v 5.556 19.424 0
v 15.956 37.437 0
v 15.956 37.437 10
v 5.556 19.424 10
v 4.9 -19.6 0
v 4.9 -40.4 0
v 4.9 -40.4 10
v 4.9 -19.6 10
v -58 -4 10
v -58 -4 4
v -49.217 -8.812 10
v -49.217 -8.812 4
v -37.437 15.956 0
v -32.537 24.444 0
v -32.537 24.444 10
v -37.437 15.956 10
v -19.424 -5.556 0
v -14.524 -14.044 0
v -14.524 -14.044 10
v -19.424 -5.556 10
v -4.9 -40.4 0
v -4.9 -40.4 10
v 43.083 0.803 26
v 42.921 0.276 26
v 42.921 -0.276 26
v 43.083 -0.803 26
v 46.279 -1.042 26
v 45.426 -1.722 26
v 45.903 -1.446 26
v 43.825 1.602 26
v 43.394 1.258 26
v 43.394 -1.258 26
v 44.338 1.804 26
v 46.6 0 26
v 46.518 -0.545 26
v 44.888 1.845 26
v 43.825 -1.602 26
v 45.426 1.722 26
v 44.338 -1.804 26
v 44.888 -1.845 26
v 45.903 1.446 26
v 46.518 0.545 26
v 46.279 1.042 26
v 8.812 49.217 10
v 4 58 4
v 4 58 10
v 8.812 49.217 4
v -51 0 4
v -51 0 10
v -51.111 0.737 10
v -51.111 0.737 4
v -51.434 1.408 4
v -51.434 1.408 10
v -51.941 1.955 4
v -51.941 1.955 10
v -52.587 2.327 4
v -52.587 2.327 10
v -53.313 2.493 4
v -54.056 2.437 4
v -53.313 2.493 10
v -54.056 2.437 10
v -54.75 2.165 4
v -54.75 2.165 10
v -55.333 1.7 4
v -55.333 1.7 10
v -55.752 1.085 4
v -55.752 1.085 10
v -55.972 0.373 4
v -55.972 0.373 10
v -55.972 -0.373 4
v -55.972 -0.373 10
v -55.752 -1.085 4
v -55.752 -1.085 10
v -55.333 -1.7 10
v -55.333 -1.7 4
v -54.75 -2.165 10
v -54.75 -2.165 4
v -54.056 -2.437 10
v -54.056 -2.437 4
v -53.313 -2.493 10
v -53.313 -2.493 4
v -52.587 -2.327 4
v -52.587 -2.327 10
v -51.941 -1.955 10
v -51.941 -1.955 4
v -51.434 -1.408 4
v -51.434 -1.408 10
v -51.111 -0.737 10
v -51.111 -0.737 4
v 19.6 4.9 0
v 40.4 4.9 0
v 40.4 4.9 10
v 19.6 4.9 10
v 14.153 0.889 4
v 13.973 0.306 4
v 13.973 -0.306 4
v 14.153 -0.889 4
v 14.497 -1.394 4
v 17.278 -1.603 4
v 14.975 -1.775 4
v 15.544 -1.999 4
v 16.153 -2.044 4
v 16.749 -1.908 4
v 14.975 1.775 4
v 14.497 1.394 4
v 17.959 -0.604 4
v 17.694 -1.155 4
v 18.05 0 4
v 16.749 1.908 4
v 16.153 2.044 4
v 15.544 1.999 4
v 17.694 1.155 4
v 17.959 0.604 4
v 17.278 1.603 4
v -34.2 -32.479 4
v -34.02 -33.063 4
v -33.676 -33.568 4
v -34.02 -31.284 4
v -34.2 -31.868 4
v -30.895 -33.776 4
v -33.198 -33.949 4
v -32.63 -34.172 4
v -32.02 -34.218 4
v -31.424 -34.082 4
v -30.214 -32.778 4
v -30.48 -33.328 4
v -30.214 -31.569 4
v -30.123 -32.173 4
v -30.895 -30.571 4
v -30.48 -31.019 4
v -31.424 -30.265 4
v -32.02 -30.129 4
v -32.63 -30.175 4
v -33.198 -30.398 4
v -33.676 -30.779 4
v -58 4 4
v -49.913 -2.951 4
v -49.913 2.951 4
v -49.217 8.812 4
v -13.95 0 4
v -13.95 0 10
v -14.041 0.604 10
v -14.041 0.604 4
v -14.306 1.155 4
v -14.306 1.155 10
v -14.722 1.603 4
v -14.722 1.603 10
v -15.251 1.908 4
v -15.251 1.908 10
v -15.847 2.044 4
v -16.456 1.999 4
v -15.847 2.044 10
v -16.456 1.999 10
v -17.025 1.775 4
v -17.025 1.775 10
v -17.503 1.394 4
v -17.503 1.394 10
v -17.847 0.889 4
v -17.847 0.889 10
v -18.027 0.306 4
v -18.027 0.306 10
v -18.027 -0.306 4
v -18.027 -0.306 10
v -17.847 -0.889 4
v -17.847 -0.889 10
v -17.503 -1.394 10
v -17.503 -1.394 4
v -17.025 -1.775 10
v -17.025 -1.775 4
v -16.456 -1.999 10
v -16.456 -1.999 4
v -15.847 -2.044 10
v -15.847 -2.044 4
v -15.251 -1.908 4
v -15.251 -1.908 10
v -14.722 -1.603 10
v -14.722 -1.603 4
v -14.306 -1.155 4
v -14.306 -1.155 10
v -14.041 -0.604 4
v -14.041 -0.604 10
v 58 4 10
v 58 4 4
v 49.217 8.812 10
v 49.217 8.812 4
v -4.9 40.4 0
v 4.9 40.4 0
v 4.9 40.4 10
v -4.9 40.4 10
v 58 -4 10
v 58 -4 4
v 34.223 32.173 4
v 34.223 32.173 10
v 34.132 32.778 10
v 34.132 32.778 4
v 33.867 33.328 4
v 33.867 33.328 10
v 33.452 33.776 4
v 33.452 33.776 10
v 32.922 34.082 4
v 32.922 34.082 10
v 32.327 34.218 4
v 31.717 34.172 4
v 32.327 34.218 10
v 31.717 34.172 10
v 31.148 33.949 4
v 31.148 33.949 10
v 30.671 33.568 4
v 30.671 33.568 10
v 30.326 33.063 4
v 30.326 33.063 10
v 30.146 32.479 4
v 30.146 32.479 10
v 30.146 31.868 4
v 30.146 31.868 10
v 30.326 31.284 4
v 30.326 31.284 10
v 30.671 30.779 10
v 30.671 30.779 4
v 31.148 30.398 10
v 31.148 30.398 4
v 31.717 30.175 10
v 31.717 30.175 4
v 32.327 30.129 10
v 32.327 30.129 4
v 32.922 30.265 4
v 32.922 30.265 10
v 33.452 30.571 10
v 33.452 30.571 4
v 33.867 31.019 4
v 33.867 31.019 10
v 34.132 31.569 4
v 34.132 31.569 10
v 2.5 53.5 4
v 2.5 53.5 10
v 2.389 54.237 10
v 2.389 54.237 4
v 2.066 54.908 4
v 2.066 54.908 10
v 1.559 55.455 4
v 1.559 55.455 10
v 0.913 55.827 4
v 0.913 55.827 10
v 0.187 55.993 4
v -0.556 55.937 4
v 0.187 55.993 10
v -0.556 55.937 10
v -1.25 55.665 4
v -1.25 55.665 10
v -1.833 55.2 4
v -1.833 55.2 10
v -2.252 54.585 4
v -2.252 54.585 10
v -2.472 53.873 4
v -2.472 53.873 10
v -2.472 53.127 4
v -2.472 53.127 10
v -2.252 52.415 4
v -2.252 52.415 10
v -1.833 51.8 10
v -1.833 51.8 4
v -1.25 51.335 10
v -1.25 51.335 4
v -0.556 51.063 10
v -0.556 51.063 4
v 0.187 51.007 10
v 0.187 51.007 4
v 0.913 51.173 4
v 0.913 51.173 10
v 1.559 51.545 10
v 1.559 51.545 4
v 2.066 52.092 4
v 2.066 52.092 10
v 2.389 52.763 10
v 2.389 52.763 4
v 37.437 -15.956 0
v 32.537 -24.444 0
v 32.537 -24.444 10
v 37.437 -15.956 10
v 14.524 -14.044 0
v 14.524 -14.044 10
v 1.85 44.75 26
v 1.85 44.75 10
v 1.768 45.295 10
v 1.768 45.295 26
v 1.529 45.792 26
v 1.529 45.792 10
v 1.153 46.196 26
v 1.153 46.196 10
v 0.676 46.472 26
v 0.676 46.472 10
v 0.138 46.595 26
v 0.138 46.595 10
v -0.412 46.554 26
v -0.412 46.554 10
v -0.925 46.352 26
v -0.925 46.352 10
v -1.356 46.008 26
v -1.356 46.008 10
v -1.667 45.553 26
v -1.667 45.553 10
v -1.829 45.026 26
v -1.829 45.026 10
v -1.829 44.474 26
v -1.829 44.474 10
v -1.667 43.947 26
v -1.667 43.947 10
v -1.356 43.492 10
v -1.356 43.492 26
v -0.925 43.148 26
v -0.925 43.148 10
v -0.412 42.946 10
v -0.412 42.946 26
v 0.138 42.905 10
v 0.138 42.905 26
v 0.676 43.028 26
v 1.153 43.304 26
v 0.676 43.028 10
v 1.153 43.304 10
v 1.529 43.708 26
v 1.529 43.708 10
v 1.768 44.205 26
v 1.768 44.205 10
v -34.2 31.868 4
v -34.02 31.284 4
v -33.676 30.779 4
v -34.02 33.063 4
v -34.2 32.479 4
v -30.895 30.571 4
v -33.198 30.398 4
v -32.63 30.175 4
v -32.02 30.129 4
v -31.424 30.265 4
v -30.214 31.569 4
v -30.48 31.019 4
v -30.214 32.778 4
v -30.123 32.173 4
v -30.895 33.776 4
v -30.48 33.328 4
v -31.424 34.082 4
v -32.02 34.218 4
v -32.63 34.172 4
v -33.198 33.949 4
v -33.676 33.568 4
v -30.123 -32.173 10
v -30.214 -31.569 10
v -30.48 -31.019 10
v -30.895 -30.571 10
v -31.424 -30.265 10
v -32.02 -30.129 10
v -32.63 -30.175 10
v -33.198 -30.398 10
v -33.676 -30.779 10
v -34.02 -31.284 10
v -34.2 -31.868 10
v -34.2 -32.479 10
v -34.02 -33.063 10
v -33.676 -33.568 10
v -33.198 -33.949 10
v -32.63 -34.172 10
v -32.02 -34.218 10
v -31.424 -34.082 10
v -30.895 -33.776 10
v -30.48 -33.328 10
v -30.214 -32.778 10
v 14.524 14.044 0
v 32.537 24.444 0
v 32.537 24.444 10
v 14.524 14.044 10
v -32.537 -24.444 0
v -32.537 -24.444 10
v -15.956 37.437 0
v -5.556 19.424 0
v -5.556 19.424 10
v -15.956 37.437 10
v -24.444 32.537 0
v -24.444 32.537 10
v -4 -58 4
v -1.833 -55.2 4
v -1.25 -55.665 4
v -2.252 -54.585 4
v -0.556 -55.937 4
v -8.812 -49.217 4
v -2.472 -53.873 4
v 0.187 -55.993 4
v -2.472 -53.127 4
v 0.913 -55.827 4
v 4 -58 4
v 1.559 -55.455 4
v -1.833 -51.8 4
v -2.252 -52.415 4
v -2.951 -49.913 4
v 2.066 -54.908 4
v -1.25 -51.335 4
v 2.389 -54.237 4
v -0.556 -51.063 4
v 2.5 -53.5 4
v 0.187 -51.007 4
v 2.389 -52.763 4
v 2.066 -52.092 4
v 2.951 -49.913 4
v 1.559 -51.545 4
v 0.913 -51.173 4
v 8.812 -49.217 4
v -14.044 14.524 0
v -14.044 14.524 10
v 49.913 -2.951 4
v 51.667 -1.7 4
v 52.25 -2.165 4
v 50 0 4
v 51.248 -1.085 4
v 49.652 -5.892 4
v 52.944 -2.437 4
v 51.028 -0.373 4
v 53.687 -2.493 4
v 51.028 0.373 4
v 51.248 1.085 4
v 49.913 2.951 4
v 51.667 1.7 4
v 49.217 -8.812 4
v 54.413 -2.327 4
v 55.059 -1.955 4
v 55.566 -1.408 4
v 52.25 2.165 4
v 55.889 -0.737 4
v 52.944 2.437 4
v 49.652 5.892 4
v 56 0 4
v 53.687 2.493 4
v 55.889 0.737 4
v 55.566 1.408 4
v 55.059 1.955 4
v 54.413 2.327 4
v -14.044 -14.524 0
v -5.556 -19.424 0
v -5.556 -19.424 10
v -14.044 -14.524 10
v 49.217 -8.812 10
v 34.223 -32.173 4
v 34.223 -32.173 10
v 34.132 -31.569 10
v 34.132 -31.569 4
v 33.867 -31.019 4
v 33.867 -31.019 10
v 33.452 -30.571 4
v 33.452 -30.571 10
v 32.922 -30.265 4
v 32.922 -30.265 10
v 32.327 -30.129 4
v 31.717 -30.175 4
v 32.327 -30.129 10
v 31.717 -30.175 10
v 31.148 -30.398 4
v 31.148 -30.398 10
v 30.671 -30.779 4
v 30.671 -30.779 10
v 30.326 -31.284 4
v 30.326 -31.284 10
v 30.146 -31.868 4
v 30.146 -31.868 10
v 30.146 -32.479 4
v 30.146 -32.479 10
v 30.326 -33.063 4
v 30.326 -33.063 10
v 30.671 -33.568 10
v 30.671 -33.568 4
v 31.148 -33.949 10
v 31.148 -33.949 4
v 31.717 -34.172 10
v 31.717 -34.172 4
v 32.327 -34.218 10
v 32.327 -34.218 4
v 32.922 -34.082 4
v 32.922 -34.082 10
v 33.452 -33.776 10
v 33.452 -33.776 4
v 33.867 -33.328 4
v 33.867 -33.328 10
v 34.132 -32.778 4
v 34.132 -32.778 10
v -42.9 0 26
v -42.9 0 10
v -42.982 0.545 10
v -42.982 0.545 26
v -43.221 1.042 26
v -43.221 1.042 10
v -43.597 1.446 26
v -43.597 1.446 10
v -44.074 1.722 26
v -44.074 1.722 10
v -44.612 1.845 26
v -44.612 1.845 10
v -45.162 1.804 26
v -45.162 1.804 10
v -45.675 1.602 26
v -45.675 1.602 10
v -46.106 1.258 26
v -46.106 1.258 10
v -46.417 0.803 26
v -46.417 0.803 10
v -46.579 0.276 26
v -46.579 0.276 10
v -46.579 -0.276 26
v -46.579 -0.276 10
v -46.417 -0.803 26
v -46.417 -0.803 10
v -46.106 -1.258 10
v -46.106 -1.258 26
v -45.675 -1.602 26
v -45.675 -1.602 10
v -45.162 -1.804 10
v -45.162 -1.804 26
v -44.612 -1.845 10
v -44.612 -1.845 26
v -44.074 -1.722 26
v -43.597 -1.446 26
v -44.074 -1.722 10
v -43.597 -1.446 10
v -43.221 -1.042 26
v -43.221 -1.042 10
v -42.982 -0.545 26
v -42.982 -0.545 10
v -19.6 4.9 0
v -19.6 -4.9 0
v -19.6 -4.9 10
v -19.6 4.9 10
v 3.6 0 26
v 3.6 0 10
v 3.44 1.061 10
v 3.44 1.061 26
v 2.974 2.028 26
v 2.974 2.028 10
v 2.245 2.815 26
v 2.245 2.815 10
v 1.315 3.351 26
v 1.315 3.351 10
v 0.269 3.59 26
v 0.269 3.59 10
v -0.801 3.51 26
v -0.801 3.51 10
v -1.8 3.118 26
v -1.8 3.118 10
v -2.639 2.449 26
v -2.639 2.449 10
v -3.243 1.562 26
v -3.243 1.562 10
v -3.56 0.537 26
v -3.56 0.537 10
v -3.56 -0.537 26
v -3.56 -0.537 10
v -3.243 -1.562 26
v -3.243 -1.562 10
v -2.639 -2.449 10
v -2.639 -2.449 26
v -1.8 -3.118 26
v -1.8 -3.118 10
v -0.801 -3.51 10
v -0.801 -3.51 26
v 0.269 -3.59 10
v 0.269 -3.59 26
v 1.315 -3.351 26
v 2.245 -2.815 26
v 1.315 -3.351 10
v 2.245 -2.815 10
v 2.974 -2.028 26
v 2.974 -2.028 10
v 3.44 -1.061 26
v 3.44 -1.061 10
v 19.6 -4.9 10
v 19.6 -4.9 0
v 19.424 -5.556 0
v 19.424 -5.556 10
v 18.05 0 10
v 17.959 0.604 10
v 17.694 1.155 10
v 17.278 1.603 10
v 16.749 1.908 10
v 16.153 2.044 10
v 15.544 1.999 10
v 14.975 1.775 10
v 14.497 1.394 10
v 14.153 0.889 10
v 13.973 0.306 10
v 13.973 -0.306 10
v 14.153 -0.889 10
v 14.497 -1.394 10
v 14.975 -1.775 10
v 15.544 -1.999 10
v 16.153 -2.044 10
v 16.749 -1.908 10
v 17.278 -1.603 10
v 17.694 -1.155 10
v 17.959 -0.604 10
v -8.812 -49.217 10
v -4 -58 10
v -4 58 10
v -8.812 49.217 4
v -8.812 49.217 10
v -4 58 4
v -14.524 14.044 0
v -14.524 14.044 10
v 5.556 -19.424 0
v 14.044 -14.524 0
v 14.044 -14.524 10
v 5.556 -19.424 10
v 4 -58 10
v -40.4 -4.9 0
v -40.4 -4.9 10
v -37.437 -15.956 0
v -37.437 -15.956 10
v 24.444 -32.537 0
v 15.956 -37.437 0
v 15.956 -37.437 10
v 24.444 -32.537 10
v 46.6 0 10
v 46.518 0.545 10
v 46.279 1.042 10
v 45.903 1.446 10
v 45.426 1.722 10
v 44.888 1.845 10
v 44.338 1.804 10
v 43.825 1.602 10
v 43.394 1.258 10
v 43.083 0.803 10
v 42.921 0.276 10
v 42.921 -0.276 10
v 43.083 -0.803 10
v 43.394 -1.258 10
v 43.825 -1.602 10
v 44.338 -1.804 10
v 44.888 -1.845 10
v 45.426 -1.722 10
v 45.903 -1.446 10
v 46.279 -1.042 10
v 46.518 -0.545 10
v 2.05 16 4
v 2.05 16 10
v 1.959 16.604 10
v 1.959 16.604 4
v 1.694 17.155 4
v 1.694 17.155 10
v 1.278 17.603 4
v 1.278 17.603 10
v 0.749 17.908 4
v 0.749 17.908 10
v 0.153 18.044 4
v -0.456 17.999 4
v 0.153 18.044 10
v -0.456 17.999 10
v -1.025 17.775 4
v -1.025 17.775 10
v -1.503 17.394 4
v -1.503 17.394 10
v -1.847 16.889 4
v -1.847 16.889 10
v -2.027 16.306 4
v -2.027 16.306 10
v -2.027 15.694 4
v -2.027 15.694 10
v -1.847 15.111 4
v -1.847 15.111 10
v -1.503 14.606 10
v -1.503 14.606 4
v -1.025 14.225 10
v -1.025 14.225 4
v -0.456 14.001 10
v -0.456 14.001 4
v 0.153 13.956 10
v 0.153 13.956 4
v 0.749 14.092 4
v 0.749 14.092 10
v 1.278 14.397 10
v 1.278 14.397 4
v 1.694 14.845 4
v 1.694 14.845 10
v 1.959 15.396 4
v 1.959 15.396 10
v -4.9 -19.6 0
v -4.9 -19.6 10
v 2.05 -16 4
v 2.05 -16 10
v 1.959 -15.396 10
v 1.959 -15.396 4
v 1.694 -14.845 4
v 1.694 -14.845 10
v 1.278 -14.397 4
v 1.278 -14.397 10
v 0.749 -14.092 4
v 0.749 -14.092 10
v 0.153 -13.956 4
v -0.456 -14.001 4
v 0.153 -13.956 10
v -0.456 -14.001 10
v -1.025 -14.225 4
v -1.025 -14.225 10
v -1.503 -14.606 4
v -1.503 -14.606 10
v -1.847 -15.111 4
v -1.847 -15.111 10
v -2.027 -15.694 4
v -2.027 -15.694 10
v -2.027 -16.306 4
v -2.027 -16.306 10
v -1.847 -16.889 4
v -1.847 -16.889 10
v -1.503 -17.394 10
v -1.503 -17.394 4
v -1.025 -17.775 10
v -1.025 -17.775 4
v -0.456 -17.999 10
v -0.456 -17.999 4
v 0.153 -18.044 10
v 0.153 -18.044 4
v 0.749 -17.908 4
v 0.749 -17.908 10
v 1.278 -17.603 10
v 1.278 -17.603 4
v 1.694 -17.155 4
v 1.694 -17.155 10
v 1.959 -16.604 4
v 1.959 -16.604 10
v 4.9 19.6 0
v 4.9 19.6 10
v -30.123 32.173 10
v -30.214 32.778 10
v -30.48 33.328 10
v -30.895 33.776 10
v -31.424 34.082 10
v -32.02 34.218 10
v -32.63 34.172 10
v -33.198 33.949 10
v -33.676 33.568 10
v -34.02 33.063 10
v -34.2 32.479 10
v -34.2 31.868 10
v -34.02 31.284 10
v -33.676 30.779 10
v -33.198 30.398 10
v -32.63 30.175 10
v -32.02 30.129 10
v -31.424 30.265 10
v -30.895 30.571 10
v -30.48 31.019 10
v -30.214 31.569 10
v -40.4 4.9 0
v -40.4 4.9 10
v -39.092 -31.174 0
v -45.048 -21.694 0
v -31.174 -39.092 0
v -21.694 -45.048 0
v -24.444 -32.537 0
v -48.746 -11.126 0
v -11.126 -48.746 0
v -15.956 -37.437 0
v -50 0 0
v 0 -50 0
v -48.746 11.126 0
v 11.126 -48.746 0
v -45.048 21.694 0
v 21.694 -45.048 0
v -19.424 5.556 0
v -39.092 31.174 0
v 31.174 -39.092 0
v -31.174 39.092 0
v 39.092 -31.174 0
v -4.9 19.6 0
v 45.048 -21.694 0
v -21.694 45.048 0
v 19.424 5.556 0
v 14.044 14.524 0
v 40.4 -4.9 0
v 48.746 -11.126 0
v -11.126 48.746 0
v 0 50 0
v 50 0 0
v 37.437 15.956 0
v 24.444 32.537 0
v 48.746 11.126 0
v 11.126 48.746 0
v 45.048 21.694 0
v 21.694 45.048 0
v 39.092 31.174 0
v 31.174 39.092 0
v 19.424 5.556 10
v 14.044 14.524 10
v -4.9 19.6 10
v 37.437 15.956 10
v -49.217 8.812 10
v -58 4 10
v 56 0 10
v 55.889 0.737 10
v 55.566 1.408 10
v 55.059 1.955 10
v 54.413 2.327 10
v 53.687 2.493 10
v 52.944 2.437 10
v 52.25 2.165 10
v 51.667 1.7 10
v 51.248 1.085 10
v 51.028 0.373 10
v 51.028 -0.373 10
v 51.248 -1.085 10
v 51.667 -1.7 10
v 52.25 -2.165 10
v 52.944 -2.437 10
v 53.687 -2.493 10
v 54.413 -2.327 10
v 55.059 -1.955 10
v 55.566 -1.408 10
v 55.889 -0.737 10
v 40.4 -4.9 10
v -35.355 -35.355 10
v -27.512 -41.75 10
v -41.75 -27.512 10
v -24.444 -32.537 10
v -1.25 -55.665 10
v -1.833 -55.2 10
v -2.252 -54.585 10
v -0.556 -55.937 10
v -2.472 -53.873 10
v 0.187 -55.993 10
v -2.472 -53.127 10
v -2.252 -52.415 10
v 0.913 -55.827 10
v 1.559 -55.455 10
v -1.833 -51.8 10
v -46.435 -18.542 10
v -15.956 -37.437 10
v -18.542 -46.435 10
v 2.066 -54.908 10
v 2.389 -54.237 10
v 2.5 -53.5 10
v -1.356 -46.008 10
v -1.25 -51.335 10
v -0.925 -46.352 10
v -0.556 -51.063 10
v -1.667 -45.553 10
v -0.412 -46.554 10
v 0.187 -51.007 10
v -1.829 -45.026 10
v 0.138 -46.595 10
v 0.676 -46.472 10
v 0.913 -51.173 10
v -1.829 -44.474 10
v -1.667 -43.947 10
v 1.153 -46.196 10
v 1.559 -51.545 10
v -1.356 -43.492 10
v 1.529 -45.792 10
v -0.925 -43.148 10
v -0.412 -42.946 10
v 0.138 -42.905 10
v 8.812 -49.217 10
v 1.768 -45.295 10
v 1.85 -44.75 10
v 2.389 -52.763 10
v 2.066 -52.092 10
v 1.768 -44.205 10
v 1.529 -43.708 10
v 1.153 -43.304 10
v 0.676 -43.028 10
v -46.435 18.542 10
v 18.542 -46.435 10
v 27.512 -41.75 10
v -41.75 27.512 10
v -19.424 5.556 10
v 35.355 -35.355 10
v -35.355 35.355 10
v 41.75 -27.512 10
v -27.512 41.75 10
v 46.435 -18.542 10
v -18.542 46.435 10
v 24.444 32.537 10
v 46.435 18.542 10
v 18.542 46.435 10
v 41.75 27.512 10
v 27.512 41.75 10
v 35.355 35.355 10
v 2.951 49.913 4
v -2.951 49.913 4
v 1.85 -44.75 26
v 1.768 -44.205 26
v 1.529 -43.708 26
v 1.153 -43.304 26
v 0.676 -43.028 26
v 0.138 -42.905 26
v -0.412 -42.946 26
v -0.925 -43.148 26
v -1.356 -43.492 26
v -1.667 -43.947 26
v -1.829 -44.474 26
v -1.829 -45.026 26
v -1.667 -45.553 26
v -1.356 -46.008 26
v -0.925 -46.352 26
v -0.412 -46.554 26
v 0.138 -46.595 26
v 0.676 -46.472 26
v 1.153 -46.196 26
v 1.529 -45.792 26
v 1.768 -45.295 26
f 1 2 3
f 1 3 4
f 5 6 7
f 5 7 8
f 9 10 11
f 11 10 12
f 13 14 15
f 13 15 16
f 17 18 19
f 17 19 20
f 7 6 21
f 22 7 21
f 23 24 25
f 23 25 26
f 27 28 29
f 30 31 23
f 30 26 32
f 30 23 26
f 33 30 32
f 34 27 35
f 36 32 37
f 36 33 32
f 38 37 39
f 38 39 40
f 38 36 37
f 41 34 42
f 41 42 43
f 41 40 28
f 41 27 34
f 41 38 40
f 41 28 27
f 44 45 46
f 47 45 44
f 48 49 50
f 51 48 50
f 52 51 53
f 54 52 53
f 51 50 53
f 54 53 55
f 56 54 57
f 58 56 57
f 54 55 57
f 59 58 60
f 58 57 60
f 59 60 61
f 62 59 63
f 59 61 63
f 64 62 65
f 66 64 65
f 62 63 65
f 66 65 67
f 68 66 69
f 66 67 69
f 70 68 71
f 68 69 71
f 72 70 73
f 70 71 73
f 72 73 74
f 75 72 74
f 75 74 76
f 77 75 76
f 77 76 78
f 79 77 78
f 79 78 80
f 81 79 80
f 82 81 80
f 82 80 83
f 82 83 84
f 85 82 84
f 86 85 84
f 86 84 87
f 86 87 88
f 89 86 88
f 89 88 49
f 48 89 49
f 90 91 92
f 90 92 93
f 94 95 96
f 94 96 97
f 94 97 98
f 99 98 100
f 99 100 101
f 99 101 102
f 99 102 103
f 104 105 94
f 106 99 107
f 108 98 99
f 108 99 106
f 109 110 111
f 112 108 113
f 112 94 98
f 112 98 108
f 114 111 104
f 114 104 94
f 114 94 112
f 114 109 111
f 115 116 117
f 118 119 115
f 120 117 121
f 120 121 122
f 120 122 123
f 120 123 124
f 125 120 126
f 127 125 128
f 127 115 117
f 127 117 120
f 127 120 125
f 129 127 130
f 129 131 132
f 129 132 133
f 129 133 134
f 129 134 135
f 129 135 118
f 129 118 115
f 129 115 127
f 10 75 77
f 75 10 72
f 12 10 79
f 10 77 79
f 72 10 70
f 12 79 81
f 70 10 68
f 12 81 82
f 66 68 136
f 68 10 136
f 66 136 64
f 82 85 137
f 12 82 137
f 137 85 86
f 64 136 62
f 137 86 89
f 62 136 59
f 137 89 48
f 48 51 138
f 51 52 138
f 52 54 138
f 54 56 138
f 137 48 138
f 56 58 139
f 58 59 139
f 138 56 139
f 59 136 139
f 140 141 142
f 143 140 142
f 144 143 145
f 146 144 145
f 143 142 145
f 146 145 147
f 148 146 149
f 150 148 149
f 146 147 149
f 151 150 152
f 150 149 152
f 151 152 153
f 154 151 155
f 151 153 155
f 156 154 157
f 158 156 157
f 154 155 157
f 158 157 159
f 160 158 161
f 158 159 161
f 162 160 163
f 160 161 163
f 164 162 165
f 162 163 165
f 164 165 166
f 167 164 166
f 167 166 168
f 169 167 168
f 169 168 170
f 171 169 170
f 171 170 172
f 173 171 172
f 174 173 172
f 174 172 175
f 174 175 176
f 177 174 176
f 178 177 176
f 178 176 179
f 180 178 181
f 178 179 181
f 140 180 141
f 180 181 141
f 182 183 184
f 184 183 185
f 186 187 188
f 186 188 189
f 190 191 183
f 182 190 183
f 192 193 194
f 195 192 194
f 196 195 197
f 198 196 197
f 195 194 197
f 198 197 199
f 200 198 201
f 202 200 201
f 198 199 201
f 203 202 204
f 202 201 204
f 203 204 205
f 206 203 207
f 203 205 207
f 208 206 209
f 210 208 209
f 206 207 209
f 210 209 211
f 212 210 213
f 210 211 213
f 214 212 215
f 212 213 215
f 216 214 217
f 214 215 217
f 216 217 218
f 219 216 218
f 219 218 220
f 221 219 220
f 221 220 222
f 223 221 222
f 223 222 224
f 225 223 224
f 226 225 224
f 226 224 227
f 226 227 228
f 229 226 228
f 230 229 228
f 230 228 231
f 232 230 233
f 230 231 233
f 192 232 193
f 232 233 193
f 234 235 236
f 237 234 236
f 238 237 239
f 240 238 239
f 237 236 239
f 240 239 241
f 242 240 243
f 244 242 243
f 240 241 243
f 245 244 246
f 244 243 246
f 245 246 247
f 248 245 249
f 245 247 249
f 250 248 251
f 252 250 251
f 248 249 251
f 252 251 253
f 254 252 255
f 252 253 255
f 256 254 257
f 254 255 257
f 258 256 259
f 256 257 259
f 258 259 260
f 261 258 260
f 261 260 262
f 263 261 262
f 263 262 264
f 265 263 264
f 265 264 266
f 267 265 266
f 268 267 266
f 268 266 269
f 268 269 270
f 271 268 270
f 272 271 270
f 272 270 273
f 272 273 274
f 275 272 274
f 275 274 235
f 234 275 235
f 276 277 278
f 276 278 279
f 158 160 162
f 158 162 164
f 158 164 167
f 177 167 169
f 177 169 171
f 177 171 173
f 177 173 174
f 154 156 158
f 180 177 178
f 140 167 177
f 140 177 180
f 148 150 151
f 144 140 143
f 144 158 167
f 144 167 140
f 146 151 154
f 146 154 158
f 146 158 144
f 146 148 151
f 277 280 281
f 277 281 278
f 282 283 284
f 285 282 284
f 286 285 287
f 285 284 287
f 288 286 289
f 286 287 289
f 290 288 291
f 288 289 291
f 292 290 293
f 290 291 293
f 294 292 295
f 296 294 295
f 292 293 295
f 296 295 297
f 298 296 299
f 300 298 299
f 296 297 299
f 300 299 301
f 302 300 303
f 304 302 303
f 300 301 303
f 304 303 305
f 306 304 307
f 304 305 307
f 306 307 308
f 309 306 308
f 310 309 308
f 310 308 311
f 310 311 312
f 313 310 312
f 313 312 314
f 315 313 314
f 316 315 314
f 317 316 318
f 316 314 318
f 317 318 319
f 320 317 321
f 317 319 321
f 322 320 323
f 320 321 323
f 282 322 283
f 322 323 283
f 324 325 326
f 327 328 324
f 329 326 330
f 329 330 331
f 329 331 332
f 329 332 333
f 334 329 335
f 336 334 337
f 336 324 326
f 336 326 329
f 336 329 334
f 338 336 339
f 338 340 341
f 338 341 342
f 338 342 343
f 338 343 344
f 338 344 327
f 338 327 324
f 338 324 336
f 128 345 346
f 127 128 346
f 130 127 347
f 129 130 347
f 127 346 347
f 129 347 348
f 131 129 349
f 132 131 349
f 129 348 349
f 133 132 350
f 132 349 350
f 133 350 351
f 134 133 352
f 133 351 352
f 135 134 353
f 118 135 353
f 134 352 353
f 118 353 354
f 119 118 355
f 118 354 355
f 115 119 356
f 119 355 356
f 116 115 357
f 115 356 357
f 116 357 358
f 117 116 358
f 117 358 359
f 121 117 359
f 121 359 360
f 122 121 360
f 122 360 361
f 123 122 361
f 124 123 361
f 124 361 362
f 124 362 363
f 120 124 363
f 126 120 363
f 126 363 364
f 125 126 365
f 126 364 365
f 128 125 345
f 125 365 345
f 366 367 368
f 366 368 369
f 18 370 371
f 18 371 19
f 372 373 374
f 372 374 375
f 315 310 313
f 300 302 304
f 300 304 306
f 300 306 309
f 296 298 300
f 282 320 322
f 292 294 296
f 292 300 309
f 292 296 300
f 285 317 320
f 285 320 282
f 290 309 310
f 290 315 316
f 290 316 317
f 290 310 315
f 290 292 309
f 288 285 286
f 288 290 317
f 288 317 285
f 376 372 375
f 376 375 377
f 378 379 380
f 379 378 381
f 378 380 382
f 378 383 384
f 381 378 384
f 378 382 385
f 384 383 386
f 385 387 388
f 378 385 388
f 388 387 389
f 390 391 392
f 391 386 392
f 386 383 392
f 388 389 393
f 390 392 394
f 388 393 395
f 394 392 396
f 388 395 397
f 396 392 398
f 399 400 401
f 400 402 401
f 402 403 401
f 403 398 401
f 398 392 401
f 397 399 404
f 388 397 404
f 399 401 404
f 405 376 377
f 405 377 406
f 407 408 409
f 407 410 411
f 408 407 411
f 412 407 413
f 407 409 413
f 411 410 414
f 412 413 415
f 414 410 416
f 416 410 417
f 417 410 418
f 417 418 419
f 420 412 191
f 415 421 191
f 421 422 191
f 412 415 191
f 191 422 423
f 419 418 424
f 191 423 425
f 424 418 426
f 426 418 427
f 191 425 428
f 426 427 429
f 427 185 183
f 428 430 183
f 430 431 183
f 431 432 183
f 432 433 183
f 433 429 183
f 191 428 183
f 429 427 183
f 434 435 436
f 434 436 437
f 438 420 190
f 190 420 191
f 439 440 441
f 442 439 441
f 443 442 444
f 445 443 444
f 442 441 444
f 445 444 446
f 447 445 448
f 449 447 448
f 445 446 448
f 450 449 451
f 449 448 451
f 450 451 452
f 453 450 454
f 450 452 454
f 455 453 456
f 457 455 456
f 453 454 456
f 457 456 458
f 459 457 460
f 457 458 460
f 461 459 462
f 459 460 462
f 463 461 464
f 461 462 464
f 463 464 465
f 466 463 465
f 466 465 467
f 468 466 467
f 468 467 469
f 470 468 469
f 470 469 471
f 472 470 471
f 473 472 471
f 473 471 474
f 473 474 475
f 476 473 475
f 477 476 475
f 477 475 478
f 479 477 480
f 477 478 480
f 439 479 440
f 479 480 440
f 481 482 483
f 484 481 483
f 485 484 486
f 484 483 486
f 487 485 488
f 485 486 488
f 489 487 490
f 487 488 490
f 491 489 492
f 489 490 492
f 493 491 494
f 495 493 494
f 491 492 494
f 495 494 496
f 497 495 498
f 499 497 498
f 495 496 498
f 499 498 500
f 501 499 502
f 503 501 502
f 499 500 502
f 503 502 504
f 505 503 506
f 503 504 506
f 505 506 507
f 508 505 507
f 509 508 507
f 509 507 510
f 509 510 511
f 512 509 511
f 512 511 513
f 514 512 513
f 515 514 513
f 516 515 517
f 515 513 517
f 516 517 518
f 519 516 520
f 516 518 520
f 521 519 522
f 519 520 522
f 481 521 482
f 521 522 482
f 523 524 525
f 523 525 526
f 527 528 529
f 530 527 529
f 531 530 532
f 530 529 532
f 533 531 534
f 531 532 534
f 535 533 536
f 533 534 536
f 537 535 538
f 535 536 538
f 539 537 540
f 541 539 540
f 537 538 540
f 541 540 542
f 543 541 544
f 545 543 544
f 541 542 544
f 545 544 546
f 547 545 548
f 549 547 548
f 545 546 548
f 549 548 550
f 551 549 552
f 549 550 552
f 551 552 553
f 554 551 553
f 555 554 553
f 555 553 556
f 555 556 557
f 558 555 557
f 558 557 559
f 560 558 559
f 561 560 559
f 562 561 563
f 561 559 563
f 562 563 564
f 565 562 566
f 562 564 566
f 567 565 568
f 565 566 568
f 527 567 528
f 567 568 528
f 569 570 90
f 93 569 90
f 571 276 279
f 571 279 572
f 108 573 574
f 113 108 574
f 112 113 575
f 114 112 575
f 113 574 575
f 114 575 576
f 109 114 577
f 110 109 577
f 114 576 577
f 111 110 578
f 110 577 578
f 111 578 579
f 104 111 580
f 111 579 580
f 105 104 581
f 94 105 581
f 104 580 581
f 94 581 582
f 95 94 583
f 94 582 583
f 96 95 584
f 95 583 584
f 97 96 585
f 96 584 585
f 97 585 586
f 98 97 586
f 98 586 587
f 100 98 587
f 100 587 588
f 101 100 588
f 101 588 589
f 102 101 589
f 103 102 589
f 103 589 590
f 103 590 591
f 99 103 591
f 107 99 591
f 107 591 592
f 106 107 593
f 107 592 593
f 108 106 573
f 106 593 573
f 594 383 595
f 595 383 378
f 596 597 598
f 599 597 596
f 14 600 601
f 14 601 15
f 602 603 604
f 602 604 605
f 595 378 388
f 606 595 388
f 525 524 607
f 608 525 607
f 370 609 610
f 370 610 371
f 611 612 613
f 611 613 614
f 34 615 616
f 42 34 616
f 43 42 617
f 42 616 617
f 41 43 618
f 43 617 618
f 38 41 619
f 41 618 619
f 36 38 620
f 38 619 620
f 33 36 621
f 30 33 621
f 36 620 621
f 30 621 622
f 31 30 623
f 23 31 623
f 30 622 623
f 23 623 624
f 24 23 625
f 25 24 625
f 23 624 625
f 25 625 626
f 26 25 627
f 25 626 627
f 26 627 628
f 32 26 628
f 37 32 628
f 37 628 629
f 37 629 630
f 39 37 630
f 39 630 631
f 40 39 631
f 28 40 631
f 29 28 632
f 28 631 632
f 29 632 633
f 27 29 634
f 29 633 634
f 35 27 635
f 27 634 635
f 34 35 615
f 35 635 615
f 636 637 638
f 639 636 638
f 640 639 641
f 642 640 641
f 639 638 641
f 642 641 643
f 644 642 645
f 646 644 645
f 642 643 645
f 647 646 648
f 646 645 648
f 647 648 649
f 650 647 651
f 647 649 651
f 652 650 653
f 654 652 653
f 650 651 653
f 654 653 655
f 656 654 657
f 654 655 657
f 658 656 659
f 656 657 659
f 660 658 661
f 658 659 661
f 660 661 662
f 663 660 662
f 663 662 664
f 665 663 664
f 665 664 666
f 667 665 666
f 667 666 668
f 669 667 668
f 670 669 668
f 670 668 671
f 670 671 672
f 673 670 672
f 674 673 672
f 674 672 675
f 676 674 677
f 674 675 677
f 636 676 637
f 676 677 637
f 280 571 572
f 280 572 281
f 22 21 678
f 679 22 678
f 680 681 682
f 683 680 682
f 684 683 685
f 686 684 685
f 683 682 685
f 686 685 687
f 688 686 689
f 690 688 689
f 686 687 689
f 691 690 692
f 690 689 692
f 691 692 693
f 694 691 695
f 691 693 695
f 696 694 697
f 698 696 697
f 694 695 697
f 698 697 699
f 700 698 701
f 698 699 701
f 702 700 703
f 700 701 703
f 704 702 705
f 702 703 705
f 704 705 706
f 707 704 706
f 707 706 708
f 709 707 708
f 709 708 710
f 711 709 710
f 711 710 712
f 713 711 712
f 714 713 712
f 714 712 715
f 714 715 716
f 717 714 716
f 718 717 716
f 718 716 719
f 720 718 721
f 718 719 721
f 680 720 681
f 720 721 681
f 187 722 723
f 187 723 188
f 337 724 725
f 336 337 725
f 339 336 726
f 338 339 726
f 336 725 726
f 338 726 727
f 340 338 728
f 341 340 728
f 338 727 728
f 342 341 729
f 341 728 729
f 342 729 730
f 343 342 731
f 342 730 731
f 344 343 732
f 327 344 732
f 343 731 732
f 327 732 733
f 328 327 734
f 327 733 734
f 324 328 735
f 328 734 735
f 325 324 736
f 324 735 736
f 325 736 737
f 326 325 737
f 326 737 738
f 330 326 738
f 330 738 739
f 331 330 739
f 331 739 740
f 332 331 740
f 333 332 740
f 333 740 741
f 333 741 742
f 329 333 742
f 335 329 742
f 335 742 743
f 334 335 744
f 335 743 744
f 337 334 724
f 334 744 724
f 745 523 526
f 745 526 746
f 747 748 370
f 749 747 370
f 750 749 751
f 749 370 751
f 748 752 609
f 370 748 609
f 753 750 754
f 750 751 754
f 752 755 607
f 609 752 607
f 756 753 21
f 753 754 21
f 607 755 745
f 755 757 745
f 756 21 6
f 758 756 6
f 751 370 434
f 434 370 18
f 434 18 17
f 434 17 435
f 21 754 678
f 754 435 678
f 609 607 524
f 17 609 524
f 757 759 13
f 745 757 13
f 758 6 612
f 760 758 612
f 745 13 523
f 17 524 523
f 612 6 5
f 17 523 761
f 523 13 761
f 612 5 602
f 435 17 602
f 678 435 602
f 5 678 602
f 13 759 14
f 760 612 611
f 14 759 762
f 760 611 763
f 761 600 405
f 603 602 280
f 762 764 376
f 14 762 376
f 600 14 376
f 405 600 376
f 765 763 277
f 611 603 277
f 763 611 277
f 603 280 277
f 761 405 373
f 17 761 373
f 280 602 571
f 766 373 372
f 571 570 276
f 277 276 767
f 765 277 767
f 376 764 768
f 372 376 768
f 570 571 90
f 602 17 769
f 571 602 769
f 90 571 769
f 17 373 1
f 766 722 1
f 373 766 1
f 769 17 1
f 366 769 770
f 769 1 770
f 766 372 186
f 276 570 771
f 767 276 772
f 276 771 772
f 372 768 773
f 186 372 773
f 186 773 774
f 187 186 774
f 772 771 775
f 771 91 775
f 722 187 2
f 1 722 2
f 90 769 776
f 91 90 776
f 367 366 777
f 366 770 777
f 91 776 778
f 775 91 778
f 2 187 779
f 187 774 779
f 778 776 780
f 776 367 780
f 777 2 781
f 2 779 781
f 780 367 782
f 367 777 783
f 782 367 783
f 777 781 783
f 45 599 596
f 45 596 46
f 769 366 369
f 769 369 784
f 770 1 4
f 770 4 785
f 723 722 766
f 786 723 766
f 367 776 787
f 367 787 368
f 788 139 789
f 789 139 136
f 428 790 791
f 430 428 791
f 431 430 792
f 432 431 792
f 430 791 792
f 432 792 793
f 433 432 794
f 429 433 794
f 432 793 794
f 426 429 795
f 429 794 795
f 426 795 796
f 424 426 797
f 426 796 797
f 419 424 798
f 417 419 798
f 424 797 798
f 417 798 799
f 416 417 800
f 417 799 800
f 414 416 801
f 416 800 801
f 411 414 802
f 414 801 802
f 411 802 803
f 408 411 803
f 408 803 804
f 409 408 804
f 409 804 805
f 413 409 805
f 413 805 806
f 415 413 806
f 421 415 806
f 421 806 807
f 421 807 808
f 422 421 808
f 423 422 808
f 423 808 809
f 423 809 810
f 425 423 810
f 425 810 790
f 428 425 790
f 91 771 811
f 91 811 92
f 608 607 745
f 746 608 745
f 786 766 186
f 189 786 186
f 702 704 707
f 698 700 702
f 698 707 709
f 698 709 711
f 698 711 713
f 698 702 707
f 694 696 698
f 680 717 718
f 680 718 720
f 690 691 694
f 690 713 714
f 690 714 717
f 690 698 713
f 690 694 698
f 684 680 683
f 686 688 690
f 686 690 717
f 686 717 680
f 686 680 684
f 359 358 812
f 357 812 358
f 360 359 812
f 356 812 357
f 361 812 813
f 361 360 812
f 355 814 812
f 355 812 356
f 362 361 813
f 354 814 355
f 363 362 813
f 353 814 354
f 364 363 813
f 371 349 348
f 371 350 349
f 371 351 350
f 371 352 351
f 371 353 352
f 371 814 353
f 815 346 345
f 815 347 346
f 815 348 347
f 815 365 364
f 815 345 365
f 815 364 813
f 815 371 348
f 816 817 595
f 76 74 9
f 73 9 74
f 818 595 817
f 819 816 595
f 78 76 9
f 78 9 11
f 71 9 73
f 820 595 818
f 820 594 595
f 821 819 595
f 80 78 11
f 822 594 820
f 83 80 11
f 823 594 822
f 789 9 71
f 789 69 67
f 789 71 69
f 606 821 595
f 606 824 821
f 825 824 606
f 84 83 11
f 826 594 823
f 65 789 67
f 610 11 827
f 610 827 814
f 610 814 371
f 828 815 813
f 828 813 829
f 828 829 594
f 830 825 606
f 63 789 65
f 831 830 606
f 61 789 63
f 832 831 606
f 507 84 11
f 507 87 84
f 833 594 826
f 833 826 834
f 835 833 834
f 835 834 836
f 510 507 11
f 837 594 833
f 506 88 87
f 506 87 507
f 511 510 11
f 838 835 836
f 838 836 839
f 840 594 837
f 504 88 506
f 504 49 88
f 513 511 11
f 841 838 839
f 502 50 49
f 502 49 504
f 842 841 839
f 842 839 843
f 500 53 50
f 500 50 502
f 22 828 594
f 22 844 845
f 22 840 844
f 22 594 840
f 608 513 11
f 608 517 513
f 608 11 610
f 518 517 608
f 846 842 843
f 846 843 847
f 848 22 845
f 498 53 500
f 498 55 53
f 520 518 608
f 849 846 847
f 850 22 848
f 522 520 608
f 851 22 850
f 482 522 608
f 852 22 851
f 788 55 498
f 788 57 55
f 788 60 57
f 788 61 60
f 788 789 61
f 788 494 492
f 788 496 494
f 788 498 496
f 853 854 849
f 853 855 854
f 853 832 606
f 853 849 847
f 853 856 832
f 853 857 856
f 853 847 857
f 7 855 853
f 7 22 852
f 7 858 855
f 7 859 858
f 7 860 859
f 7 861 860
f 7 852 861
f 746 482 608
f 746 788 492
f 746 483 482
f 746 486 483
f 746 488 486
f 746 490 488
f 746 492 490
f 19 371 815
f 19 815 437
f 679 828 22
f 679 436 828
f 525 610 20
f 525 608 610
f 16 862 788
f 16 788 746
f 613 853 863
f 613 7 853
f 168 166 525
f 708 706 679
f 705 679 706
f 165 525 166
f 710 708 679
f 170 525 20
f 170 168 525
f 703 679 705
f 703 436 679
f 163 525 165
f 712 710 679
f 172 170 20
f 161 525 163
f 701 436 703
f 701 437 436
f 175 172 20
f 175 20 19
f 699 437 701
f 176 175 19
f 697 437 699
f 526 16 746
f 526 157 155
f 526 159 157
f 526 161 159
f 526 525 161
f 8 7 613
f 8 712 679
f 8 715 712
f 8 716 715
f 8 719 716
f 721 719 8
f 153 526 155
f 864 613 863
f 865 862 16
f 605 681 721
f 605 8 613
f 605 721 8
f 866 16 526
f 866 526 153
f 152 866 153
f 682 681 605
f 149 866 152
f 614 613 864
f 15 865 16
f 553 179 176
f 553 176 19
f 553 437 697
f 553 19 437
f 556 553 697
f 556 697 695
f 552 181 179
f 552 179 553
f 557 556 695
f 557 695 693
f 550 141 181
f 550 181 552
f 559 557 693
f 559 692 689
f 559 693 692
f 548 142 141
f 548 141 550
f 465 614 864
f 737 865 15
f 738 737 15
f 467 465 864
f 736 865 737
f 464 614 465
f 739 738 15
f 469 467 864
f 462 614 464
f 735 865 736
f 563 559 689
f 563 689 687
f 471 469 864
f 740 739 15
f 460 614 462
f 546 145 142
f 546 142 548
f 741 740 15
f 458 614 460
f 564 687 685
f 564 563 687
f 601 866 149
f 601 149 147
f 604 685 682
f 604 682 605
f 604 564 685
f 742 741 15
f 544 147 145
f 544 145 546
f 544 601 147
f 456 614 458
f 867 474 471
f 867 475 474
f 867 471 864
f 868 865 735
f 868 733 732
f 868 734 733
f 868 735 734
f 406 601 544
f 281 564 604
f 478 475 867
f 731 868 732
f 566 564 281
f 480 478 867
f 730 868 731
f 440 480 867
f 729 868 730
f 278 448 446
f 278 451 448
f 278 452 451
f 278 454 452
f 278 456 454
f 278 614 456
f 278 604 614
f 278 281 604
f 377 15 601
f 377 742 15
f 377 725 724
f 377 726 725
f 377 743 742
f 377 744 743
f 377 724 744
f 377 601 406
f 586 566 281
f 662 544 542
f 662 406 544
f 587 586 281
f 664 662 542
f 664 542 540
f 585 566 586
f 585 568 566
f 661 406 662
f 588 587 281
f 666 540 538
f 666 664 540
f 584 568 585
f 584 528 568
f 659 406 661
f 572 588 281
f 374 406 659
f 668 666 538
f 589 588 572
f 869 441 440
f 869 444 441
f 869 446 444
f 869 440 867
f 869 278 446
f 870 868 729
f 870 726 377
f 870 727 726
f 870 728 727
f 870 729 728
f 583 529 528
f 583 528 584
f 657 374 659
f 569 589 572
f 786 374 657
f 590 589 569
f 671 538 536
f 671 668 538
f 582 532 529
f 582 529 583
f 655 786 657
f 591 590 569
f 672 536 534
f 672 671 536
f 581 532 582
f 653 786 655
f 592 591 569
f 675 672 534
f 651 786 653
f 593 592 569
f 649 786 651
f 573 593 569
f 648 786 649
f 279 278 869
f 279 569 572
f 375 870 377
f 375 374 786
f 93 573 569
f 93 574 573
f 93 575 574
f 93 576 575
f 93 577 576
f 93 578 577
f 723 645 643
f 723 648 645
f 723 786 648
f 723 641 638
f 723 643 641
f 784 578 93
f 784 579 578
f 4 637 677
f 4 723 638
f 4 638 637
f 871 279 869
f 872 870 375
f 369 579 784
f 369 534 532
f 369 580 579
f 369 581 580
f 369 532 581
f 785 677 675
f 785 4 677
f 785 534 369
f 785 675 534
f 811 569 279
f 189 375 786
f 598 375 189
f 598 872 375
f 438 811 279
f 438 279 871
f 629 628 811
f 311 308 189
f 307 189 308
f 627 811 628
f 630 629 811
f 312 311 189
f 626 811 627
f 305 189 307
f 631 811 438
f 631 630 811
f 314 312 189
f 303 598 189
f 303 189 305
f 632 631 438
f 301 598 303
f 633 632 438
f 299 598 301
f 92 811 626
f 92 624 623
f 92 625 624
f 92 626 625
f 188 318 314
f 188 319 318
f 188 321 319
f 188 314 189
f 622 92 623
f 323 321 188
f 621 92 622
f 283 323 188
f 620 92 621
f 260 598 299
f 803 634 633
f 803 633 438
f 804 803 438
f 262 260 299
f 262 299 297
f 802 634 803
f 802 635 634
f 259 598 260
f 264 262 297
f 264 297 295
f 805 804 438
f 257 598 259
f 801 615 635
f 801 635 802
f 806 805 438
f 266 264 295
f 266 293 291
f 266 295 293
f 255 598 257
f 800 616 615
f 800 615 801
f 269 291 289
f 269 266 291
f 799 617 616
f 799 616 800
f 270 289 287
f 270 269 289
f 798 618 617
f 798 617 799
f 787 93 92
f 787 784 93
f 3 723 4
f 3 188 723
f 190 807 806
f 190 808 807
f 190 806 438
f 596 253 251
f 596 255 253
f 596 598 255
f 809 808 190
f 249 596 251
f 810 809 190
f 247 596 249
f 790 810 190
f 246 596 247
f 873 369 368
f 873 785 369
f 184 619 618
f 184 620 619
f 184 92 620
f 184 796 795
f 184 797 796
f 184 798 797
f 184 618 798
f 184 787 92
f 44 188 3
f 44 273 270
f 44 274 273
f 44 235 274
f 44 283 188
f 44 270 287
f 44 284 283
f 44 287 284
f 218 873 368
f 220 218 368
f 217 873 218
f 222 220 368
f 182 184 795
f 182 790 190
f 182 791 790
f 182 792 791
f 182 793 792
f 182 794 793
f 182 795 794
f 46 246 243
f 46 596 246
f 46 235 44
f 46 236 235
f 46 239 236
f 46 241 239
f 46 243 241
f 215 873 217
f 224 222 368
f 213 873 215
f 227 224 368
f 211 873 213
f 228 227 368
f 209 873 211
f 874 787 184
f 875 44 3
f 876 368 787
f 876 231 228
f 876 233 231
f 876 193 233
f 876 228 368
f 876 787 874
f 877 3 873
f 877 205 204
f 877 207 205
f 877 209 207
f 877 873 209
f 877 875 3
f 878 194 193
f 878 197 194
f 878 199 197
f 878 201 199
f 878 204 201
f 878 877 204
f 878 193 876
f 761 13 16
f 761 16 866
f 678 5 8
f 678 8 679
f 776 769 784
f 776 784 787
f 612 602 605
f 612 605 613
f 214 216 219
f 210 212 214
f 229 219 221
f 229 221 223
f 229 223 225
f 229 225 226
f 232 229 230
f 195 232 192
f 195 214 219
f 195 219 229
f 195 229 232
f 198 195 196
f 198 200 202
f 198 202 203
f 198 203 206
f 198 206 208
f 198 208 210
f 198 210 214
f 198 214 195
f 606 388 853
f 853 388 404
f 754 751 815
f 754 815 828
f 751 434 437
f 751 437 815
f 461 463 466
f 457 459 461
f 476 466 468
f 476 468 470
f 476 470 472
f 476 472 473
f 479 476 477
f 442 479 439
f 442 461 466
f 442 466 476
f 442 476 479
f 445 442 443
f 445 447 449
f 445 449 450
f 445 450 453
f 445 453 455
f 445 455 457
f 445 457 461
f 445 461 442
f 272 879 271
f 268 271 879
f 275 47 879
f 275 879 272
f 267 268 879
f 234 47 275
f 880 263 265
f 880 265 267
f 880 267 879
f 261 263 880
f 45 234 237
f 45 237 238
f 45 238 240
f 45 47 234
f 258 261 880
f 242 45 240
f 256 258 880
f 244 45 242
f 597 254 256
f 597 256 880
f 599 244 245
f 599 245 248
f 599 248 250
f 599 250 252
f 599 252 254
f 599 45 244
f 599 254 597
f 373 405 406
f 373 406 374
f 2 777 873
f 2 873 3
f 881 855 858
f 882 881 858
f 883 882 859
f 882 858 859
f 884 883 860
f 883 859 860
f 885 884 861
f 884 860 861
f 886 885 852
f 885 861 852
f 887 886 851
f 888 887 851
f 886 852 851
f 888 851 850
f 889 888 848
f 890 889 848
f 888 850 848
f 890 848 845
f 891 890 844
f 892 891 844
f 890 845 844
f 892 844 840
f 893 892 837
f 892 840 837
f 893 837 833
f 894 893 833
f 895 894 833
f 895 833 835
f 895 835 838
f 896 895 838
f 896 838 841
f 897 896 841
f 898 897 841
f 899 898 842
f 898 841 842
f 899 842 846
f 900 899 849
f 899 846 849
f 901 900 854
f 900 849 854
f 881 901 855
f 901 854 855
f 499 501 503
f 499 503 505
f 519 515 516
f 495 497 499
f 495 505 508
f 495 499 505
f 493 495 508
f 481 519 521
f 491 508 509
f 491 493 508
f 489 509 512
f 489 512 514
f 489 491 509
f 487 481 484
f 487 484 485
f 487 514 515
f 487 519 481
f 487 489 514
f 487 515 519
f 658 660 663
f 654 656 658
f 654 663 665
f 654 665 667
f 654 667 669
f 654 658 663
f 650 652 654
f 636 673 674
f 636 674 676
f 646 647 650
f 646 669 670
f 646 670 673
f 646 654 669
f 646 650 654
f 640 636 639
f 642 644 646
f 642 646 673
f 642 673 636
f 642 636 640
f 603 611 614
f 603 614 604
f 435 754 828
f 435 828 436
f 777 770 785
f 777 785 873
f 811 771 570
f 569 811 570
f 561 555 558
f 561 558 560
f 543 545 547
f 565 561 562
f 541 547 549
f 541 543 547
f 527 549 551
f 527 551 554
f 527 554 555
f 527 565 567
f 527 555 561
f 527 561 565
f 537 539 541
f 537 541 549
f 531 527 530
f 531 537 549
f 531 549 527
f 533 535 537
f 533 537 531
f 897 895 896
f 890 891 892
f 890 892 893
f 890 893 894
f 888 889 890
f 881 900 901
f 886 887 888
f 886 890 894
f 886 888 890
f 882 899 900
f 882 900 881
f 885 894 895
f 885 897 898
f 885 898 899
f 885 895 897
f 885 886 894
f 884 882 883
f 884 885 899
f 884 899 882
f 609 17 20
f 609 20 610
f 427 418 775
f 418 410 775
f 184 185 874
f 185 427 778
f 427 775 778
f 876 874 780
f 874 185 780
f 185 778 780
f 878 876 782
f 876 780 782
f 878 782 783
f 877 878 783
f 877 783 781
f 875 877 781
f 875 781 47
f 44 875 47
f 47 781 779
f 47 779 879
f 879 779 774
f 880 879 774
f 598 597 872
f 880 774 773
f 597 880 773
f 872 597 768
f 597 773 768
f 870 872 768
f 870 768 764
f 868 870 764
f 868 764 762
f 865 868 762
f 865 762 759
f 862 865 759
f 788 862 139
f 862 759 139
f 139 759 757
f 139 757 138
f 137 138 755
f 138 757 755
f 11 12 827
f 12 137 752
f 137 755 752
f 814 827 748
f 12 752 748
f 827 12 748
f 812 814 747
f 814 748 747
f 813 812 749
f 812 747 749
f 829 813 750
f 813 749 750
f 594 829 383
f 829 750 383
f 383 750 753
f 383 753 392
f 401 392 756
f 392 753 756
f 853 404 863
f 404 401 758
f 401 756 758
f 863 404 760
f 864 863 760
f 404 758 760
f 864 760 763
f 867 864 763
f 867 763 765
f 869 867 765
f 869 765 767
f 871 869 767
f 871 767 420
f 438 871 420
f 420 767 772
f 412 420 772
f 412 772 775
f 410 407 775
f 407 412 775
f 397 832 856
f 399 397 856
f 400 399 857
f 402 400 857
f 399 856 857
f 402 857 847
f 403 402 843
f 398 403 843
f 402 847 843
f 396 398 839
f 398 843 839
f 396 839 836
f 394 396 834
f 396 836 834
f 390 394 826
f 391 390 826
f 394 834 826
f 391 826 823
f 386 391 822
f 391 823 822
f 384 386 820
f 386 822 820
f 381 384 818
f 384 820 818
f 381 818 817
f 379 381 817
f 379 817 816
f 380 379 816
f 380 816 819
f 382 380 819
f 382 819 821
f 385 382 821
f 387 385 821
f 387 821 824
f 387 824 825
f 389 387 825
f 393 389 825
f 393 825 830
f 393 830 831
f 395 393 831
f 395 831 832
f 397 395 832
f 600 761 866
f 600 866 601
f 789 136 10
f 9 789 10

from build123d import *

# Parameters (mm, degrees)
CROQUIS2_R              = 50
SALIENTE_EXTRUIR1_DEPTH = 10
CROQUIS1_W              = 9.8
CROQUIS1_H              = 20.8
CROQUIS1_W_2            = 20.8
CROQUIS1_H_2            = 9.8
CORTAR_EXTRUIR3_DEPTH   = 72.414284285
CROQUIS4_R              = 3.6
SALIENTE_EXTRUIR2_DEPTH = 16
CROQUIS5_R              = 1.85
SALIENTE_EXTRUIR3_DEPTH = 16
SALIENTE_EXTRUIR4_START = -6
SALIENTE_EXTRUIR4_DEPTH = 6
CROQUIS8_R              = 2.5
CORTAR_EXTRUIR4_DEPTH   = 6.5
CROQUIS9_R              = 2.05
CORTAR_EXTRUIR5_DEPTH   = 6


with BuildPart() as part:
    # Croquis2 → Saliente-Extruir1 (new body)
    with BuildSketch(Plane(origin=(0, 0, 0), x_dir=(0, 1, 0), z_dir=(0, 0, 1))):
        with Locations(Location((0, 0, 0), (0, 0, 270))):
            Circle(CROQUIS2_R)
    extrude(amount=SALIENTE_EXTRUIR1_DEPTH)

    # Croquis1 → Cortar-Extruir3 (cut, through all)
    with BuildSketch(Plane(origin=(0, 0, 0), x_dir=(0, 1, 0), z_dir=(0, 0, 1))):
        Polygon((15.956475521, 37.437426313), (5.556475521, 19.424097914), (14.043524479, 14.524097914), (24.443524479, 32.537426313), align=None)
        with Locations((0, 30)):
            Rectangle(CROQUIS1_W, CROQUIS1_H)
        Polygon((32.537426313, 24.443524479), (14.524097914, 14.043524479), (19.424097914, 5.556475521), (37.437426313, 15.956475521), align=None)
        with Locations((30, 0)):
            Rectangle(CROQUIS1_W_2, CROQUIS1_H_2)
        Polygon((37.437426313, -15.956475521), (19.424097914, -5.556475521), (14.524097914, -14.043524479), (32.537426313, -24.443524479), align=None)
        Polygon((24.443524479, -32.537426313), (14.043524479, -14.524097914), (5.556475521, -19.424097914), (15.956475521, -37.437426313), align=None)
        with Locations((0, -30)):
            Rectangle(CROQUIS1_W, CROQUIS1_H)
        Polygon((-15.956475521, -37.437426313), (-5.556475521, -19.424097914), (-14.043524479, -14.524097914), (-24.443524479, -32.537426313), align=None)
        Polygon((-32.537426313, -24.443524479), (-14.524097914, -14.043524479), (-19.424097914, -5.556475521), (-37.437426313, -15.956475521), align=None)
        with Locations((-30, 0)):
            Rectangle(CROQUIS1_W_2, CROQUIS1_H_2)
        Polygon((-37.437426313, 15.956475521), (-19.424097914, 5.556475521), (-14.524097914, 14.043524479), (-32.537426313, 24.443524479), align=None)
        Polygon((-24.443524479, 32.537426313), (-14.043524479, 14.524097914), (-5.556475521, 19.424097914), (-15.956475521, 37.437426313), align=None)
    extrude(amount=CORTAR_EXTRUIR3_DEPTH, mode=Mode.SUBTRACT)

    # Croquis4 → Saliente-Extruir2 (add)
    with BuildSketch(Plane.XY.offset(10)):
        Circle(CROQUIS4_R)
    extrude(amount=SALIENTE_EXTRUIR2_DEPTH)

    # Croquis5 → Saliente-Extruir3 (add)
    with BuildSketch(Plane.XY.offset(10)):
        with Locations((0, 44.75)):
            Circle(CROQUIS5_R)
        with Locations((44.75, 0)):
            Circle(CROQUIS5_R)
        with Locations((0, -44.75)):
            Circle(CROQUIS5_R)
        with Locations((-44.75, 0)):
            Circle(CROQUIS5_R)
    extrude(amount=SALIENTE_EXTRUIR3_DEPTH)

    # Croquis7 → Saliente-Extruir4 (add)
    with BuildSketch(Plane.XY.offset(10).offset(SALIENTE_EXTRUIR4_START)):
        with BuildLine():
            Line((4, 58), (8.81247625, 49.217276056))
            ThreePointArc((8.81247625, 49.217276056), (0, 50), (-8.81247625, 49.217276056))
            Line((-8.81247625, 49.217276056), (-4, 58))
            Line((-4, 58), (4, 58))
        make_face()
        with BuildLine():
            Line((58, 4), (49.217276056, 8.81247625))
            ThreePointArc((49.217276056, 8.81247625), (50, 0), (49.217276056, -8.81247625))
            Line((49.217276056, -8.81247625), (58, -4))
            Line((58, -4), (58, 4))
        make_face()
        with BuildLine():
            Line((4, -58), (8.81247625, -49.217276056))
            ThreePointArc((8.81247625, -49.217276056), (0, -50), (-8.81247625, -49.217276056))
            Line((-8.81247625, -49.217276056), (-4, -58))
            Line((-4, -58), (4, -58))
        make_face()
        with BuildLine():
            Line((-58, -4), (-49.217276056, -8.81247625))
            ThreePointArc((-49.217276056, -8.81247625), (-50, 0), (-49.217276056, 8.81247625))
            Line((-49.217276056, 8.81247625), (-58, 4))
            Line((-58, 4), (-58, -4))
        make_face()
    extrude(amount=SALIENTE_EXTRUIR4_DEPTH)

    # Croquis8 → Cortar-Extruir4 (cut)
    with BuildSketch(Plane.XY.offset(10)):
        with Locations((0, 53.5)):
            Circle(CROQUIS8_R)
        with Locations((53.5, 0)):
            Circle(CROQUIS8_R)
        with Locations((0, -53.5)):
            Circle(CROQUIS8_R)
        with Locations((-53.5, 0)):
            Circle(CROQUIS8_R)
    extrude(amount=-CORTAR_EXTRUIR4_DEPTH, mode=Mode.SUBTRACT)

    # Croquis9 → Cortar-Extruir5 (cut)
    with BuildSketch(Plane.XY.offset(10)):
        with Locations((0, 16)):
            Circle(CROQUIS9_R)
        with Locations((16, 0)):
            Circle(CROQUIS9_R)
        with Locations((0, -16)):
            Circle(CROQUIS9_R)
        with Locations((-16, 0)):
            Circle(CROQUIS9_R)
        with Locations((-32.173358544, 32.173358544)):
            Circle(CROQUIS9_R)
        with Locations((32.173358544, 32.173358544)):
            Circle(CROQUIS9_R)
        with Locations((32.173358544, -32.173358544)):
            Circle(CROQUIS9_R)
        with Locations((-32.173358544, -32.173358544)):
            Circle(CROQUIS9_R)
    extrude(amount=-CORTAR_EXTRUIR5_DEPTH, mode=Mode.SUBTRACT)


solid = part.part
